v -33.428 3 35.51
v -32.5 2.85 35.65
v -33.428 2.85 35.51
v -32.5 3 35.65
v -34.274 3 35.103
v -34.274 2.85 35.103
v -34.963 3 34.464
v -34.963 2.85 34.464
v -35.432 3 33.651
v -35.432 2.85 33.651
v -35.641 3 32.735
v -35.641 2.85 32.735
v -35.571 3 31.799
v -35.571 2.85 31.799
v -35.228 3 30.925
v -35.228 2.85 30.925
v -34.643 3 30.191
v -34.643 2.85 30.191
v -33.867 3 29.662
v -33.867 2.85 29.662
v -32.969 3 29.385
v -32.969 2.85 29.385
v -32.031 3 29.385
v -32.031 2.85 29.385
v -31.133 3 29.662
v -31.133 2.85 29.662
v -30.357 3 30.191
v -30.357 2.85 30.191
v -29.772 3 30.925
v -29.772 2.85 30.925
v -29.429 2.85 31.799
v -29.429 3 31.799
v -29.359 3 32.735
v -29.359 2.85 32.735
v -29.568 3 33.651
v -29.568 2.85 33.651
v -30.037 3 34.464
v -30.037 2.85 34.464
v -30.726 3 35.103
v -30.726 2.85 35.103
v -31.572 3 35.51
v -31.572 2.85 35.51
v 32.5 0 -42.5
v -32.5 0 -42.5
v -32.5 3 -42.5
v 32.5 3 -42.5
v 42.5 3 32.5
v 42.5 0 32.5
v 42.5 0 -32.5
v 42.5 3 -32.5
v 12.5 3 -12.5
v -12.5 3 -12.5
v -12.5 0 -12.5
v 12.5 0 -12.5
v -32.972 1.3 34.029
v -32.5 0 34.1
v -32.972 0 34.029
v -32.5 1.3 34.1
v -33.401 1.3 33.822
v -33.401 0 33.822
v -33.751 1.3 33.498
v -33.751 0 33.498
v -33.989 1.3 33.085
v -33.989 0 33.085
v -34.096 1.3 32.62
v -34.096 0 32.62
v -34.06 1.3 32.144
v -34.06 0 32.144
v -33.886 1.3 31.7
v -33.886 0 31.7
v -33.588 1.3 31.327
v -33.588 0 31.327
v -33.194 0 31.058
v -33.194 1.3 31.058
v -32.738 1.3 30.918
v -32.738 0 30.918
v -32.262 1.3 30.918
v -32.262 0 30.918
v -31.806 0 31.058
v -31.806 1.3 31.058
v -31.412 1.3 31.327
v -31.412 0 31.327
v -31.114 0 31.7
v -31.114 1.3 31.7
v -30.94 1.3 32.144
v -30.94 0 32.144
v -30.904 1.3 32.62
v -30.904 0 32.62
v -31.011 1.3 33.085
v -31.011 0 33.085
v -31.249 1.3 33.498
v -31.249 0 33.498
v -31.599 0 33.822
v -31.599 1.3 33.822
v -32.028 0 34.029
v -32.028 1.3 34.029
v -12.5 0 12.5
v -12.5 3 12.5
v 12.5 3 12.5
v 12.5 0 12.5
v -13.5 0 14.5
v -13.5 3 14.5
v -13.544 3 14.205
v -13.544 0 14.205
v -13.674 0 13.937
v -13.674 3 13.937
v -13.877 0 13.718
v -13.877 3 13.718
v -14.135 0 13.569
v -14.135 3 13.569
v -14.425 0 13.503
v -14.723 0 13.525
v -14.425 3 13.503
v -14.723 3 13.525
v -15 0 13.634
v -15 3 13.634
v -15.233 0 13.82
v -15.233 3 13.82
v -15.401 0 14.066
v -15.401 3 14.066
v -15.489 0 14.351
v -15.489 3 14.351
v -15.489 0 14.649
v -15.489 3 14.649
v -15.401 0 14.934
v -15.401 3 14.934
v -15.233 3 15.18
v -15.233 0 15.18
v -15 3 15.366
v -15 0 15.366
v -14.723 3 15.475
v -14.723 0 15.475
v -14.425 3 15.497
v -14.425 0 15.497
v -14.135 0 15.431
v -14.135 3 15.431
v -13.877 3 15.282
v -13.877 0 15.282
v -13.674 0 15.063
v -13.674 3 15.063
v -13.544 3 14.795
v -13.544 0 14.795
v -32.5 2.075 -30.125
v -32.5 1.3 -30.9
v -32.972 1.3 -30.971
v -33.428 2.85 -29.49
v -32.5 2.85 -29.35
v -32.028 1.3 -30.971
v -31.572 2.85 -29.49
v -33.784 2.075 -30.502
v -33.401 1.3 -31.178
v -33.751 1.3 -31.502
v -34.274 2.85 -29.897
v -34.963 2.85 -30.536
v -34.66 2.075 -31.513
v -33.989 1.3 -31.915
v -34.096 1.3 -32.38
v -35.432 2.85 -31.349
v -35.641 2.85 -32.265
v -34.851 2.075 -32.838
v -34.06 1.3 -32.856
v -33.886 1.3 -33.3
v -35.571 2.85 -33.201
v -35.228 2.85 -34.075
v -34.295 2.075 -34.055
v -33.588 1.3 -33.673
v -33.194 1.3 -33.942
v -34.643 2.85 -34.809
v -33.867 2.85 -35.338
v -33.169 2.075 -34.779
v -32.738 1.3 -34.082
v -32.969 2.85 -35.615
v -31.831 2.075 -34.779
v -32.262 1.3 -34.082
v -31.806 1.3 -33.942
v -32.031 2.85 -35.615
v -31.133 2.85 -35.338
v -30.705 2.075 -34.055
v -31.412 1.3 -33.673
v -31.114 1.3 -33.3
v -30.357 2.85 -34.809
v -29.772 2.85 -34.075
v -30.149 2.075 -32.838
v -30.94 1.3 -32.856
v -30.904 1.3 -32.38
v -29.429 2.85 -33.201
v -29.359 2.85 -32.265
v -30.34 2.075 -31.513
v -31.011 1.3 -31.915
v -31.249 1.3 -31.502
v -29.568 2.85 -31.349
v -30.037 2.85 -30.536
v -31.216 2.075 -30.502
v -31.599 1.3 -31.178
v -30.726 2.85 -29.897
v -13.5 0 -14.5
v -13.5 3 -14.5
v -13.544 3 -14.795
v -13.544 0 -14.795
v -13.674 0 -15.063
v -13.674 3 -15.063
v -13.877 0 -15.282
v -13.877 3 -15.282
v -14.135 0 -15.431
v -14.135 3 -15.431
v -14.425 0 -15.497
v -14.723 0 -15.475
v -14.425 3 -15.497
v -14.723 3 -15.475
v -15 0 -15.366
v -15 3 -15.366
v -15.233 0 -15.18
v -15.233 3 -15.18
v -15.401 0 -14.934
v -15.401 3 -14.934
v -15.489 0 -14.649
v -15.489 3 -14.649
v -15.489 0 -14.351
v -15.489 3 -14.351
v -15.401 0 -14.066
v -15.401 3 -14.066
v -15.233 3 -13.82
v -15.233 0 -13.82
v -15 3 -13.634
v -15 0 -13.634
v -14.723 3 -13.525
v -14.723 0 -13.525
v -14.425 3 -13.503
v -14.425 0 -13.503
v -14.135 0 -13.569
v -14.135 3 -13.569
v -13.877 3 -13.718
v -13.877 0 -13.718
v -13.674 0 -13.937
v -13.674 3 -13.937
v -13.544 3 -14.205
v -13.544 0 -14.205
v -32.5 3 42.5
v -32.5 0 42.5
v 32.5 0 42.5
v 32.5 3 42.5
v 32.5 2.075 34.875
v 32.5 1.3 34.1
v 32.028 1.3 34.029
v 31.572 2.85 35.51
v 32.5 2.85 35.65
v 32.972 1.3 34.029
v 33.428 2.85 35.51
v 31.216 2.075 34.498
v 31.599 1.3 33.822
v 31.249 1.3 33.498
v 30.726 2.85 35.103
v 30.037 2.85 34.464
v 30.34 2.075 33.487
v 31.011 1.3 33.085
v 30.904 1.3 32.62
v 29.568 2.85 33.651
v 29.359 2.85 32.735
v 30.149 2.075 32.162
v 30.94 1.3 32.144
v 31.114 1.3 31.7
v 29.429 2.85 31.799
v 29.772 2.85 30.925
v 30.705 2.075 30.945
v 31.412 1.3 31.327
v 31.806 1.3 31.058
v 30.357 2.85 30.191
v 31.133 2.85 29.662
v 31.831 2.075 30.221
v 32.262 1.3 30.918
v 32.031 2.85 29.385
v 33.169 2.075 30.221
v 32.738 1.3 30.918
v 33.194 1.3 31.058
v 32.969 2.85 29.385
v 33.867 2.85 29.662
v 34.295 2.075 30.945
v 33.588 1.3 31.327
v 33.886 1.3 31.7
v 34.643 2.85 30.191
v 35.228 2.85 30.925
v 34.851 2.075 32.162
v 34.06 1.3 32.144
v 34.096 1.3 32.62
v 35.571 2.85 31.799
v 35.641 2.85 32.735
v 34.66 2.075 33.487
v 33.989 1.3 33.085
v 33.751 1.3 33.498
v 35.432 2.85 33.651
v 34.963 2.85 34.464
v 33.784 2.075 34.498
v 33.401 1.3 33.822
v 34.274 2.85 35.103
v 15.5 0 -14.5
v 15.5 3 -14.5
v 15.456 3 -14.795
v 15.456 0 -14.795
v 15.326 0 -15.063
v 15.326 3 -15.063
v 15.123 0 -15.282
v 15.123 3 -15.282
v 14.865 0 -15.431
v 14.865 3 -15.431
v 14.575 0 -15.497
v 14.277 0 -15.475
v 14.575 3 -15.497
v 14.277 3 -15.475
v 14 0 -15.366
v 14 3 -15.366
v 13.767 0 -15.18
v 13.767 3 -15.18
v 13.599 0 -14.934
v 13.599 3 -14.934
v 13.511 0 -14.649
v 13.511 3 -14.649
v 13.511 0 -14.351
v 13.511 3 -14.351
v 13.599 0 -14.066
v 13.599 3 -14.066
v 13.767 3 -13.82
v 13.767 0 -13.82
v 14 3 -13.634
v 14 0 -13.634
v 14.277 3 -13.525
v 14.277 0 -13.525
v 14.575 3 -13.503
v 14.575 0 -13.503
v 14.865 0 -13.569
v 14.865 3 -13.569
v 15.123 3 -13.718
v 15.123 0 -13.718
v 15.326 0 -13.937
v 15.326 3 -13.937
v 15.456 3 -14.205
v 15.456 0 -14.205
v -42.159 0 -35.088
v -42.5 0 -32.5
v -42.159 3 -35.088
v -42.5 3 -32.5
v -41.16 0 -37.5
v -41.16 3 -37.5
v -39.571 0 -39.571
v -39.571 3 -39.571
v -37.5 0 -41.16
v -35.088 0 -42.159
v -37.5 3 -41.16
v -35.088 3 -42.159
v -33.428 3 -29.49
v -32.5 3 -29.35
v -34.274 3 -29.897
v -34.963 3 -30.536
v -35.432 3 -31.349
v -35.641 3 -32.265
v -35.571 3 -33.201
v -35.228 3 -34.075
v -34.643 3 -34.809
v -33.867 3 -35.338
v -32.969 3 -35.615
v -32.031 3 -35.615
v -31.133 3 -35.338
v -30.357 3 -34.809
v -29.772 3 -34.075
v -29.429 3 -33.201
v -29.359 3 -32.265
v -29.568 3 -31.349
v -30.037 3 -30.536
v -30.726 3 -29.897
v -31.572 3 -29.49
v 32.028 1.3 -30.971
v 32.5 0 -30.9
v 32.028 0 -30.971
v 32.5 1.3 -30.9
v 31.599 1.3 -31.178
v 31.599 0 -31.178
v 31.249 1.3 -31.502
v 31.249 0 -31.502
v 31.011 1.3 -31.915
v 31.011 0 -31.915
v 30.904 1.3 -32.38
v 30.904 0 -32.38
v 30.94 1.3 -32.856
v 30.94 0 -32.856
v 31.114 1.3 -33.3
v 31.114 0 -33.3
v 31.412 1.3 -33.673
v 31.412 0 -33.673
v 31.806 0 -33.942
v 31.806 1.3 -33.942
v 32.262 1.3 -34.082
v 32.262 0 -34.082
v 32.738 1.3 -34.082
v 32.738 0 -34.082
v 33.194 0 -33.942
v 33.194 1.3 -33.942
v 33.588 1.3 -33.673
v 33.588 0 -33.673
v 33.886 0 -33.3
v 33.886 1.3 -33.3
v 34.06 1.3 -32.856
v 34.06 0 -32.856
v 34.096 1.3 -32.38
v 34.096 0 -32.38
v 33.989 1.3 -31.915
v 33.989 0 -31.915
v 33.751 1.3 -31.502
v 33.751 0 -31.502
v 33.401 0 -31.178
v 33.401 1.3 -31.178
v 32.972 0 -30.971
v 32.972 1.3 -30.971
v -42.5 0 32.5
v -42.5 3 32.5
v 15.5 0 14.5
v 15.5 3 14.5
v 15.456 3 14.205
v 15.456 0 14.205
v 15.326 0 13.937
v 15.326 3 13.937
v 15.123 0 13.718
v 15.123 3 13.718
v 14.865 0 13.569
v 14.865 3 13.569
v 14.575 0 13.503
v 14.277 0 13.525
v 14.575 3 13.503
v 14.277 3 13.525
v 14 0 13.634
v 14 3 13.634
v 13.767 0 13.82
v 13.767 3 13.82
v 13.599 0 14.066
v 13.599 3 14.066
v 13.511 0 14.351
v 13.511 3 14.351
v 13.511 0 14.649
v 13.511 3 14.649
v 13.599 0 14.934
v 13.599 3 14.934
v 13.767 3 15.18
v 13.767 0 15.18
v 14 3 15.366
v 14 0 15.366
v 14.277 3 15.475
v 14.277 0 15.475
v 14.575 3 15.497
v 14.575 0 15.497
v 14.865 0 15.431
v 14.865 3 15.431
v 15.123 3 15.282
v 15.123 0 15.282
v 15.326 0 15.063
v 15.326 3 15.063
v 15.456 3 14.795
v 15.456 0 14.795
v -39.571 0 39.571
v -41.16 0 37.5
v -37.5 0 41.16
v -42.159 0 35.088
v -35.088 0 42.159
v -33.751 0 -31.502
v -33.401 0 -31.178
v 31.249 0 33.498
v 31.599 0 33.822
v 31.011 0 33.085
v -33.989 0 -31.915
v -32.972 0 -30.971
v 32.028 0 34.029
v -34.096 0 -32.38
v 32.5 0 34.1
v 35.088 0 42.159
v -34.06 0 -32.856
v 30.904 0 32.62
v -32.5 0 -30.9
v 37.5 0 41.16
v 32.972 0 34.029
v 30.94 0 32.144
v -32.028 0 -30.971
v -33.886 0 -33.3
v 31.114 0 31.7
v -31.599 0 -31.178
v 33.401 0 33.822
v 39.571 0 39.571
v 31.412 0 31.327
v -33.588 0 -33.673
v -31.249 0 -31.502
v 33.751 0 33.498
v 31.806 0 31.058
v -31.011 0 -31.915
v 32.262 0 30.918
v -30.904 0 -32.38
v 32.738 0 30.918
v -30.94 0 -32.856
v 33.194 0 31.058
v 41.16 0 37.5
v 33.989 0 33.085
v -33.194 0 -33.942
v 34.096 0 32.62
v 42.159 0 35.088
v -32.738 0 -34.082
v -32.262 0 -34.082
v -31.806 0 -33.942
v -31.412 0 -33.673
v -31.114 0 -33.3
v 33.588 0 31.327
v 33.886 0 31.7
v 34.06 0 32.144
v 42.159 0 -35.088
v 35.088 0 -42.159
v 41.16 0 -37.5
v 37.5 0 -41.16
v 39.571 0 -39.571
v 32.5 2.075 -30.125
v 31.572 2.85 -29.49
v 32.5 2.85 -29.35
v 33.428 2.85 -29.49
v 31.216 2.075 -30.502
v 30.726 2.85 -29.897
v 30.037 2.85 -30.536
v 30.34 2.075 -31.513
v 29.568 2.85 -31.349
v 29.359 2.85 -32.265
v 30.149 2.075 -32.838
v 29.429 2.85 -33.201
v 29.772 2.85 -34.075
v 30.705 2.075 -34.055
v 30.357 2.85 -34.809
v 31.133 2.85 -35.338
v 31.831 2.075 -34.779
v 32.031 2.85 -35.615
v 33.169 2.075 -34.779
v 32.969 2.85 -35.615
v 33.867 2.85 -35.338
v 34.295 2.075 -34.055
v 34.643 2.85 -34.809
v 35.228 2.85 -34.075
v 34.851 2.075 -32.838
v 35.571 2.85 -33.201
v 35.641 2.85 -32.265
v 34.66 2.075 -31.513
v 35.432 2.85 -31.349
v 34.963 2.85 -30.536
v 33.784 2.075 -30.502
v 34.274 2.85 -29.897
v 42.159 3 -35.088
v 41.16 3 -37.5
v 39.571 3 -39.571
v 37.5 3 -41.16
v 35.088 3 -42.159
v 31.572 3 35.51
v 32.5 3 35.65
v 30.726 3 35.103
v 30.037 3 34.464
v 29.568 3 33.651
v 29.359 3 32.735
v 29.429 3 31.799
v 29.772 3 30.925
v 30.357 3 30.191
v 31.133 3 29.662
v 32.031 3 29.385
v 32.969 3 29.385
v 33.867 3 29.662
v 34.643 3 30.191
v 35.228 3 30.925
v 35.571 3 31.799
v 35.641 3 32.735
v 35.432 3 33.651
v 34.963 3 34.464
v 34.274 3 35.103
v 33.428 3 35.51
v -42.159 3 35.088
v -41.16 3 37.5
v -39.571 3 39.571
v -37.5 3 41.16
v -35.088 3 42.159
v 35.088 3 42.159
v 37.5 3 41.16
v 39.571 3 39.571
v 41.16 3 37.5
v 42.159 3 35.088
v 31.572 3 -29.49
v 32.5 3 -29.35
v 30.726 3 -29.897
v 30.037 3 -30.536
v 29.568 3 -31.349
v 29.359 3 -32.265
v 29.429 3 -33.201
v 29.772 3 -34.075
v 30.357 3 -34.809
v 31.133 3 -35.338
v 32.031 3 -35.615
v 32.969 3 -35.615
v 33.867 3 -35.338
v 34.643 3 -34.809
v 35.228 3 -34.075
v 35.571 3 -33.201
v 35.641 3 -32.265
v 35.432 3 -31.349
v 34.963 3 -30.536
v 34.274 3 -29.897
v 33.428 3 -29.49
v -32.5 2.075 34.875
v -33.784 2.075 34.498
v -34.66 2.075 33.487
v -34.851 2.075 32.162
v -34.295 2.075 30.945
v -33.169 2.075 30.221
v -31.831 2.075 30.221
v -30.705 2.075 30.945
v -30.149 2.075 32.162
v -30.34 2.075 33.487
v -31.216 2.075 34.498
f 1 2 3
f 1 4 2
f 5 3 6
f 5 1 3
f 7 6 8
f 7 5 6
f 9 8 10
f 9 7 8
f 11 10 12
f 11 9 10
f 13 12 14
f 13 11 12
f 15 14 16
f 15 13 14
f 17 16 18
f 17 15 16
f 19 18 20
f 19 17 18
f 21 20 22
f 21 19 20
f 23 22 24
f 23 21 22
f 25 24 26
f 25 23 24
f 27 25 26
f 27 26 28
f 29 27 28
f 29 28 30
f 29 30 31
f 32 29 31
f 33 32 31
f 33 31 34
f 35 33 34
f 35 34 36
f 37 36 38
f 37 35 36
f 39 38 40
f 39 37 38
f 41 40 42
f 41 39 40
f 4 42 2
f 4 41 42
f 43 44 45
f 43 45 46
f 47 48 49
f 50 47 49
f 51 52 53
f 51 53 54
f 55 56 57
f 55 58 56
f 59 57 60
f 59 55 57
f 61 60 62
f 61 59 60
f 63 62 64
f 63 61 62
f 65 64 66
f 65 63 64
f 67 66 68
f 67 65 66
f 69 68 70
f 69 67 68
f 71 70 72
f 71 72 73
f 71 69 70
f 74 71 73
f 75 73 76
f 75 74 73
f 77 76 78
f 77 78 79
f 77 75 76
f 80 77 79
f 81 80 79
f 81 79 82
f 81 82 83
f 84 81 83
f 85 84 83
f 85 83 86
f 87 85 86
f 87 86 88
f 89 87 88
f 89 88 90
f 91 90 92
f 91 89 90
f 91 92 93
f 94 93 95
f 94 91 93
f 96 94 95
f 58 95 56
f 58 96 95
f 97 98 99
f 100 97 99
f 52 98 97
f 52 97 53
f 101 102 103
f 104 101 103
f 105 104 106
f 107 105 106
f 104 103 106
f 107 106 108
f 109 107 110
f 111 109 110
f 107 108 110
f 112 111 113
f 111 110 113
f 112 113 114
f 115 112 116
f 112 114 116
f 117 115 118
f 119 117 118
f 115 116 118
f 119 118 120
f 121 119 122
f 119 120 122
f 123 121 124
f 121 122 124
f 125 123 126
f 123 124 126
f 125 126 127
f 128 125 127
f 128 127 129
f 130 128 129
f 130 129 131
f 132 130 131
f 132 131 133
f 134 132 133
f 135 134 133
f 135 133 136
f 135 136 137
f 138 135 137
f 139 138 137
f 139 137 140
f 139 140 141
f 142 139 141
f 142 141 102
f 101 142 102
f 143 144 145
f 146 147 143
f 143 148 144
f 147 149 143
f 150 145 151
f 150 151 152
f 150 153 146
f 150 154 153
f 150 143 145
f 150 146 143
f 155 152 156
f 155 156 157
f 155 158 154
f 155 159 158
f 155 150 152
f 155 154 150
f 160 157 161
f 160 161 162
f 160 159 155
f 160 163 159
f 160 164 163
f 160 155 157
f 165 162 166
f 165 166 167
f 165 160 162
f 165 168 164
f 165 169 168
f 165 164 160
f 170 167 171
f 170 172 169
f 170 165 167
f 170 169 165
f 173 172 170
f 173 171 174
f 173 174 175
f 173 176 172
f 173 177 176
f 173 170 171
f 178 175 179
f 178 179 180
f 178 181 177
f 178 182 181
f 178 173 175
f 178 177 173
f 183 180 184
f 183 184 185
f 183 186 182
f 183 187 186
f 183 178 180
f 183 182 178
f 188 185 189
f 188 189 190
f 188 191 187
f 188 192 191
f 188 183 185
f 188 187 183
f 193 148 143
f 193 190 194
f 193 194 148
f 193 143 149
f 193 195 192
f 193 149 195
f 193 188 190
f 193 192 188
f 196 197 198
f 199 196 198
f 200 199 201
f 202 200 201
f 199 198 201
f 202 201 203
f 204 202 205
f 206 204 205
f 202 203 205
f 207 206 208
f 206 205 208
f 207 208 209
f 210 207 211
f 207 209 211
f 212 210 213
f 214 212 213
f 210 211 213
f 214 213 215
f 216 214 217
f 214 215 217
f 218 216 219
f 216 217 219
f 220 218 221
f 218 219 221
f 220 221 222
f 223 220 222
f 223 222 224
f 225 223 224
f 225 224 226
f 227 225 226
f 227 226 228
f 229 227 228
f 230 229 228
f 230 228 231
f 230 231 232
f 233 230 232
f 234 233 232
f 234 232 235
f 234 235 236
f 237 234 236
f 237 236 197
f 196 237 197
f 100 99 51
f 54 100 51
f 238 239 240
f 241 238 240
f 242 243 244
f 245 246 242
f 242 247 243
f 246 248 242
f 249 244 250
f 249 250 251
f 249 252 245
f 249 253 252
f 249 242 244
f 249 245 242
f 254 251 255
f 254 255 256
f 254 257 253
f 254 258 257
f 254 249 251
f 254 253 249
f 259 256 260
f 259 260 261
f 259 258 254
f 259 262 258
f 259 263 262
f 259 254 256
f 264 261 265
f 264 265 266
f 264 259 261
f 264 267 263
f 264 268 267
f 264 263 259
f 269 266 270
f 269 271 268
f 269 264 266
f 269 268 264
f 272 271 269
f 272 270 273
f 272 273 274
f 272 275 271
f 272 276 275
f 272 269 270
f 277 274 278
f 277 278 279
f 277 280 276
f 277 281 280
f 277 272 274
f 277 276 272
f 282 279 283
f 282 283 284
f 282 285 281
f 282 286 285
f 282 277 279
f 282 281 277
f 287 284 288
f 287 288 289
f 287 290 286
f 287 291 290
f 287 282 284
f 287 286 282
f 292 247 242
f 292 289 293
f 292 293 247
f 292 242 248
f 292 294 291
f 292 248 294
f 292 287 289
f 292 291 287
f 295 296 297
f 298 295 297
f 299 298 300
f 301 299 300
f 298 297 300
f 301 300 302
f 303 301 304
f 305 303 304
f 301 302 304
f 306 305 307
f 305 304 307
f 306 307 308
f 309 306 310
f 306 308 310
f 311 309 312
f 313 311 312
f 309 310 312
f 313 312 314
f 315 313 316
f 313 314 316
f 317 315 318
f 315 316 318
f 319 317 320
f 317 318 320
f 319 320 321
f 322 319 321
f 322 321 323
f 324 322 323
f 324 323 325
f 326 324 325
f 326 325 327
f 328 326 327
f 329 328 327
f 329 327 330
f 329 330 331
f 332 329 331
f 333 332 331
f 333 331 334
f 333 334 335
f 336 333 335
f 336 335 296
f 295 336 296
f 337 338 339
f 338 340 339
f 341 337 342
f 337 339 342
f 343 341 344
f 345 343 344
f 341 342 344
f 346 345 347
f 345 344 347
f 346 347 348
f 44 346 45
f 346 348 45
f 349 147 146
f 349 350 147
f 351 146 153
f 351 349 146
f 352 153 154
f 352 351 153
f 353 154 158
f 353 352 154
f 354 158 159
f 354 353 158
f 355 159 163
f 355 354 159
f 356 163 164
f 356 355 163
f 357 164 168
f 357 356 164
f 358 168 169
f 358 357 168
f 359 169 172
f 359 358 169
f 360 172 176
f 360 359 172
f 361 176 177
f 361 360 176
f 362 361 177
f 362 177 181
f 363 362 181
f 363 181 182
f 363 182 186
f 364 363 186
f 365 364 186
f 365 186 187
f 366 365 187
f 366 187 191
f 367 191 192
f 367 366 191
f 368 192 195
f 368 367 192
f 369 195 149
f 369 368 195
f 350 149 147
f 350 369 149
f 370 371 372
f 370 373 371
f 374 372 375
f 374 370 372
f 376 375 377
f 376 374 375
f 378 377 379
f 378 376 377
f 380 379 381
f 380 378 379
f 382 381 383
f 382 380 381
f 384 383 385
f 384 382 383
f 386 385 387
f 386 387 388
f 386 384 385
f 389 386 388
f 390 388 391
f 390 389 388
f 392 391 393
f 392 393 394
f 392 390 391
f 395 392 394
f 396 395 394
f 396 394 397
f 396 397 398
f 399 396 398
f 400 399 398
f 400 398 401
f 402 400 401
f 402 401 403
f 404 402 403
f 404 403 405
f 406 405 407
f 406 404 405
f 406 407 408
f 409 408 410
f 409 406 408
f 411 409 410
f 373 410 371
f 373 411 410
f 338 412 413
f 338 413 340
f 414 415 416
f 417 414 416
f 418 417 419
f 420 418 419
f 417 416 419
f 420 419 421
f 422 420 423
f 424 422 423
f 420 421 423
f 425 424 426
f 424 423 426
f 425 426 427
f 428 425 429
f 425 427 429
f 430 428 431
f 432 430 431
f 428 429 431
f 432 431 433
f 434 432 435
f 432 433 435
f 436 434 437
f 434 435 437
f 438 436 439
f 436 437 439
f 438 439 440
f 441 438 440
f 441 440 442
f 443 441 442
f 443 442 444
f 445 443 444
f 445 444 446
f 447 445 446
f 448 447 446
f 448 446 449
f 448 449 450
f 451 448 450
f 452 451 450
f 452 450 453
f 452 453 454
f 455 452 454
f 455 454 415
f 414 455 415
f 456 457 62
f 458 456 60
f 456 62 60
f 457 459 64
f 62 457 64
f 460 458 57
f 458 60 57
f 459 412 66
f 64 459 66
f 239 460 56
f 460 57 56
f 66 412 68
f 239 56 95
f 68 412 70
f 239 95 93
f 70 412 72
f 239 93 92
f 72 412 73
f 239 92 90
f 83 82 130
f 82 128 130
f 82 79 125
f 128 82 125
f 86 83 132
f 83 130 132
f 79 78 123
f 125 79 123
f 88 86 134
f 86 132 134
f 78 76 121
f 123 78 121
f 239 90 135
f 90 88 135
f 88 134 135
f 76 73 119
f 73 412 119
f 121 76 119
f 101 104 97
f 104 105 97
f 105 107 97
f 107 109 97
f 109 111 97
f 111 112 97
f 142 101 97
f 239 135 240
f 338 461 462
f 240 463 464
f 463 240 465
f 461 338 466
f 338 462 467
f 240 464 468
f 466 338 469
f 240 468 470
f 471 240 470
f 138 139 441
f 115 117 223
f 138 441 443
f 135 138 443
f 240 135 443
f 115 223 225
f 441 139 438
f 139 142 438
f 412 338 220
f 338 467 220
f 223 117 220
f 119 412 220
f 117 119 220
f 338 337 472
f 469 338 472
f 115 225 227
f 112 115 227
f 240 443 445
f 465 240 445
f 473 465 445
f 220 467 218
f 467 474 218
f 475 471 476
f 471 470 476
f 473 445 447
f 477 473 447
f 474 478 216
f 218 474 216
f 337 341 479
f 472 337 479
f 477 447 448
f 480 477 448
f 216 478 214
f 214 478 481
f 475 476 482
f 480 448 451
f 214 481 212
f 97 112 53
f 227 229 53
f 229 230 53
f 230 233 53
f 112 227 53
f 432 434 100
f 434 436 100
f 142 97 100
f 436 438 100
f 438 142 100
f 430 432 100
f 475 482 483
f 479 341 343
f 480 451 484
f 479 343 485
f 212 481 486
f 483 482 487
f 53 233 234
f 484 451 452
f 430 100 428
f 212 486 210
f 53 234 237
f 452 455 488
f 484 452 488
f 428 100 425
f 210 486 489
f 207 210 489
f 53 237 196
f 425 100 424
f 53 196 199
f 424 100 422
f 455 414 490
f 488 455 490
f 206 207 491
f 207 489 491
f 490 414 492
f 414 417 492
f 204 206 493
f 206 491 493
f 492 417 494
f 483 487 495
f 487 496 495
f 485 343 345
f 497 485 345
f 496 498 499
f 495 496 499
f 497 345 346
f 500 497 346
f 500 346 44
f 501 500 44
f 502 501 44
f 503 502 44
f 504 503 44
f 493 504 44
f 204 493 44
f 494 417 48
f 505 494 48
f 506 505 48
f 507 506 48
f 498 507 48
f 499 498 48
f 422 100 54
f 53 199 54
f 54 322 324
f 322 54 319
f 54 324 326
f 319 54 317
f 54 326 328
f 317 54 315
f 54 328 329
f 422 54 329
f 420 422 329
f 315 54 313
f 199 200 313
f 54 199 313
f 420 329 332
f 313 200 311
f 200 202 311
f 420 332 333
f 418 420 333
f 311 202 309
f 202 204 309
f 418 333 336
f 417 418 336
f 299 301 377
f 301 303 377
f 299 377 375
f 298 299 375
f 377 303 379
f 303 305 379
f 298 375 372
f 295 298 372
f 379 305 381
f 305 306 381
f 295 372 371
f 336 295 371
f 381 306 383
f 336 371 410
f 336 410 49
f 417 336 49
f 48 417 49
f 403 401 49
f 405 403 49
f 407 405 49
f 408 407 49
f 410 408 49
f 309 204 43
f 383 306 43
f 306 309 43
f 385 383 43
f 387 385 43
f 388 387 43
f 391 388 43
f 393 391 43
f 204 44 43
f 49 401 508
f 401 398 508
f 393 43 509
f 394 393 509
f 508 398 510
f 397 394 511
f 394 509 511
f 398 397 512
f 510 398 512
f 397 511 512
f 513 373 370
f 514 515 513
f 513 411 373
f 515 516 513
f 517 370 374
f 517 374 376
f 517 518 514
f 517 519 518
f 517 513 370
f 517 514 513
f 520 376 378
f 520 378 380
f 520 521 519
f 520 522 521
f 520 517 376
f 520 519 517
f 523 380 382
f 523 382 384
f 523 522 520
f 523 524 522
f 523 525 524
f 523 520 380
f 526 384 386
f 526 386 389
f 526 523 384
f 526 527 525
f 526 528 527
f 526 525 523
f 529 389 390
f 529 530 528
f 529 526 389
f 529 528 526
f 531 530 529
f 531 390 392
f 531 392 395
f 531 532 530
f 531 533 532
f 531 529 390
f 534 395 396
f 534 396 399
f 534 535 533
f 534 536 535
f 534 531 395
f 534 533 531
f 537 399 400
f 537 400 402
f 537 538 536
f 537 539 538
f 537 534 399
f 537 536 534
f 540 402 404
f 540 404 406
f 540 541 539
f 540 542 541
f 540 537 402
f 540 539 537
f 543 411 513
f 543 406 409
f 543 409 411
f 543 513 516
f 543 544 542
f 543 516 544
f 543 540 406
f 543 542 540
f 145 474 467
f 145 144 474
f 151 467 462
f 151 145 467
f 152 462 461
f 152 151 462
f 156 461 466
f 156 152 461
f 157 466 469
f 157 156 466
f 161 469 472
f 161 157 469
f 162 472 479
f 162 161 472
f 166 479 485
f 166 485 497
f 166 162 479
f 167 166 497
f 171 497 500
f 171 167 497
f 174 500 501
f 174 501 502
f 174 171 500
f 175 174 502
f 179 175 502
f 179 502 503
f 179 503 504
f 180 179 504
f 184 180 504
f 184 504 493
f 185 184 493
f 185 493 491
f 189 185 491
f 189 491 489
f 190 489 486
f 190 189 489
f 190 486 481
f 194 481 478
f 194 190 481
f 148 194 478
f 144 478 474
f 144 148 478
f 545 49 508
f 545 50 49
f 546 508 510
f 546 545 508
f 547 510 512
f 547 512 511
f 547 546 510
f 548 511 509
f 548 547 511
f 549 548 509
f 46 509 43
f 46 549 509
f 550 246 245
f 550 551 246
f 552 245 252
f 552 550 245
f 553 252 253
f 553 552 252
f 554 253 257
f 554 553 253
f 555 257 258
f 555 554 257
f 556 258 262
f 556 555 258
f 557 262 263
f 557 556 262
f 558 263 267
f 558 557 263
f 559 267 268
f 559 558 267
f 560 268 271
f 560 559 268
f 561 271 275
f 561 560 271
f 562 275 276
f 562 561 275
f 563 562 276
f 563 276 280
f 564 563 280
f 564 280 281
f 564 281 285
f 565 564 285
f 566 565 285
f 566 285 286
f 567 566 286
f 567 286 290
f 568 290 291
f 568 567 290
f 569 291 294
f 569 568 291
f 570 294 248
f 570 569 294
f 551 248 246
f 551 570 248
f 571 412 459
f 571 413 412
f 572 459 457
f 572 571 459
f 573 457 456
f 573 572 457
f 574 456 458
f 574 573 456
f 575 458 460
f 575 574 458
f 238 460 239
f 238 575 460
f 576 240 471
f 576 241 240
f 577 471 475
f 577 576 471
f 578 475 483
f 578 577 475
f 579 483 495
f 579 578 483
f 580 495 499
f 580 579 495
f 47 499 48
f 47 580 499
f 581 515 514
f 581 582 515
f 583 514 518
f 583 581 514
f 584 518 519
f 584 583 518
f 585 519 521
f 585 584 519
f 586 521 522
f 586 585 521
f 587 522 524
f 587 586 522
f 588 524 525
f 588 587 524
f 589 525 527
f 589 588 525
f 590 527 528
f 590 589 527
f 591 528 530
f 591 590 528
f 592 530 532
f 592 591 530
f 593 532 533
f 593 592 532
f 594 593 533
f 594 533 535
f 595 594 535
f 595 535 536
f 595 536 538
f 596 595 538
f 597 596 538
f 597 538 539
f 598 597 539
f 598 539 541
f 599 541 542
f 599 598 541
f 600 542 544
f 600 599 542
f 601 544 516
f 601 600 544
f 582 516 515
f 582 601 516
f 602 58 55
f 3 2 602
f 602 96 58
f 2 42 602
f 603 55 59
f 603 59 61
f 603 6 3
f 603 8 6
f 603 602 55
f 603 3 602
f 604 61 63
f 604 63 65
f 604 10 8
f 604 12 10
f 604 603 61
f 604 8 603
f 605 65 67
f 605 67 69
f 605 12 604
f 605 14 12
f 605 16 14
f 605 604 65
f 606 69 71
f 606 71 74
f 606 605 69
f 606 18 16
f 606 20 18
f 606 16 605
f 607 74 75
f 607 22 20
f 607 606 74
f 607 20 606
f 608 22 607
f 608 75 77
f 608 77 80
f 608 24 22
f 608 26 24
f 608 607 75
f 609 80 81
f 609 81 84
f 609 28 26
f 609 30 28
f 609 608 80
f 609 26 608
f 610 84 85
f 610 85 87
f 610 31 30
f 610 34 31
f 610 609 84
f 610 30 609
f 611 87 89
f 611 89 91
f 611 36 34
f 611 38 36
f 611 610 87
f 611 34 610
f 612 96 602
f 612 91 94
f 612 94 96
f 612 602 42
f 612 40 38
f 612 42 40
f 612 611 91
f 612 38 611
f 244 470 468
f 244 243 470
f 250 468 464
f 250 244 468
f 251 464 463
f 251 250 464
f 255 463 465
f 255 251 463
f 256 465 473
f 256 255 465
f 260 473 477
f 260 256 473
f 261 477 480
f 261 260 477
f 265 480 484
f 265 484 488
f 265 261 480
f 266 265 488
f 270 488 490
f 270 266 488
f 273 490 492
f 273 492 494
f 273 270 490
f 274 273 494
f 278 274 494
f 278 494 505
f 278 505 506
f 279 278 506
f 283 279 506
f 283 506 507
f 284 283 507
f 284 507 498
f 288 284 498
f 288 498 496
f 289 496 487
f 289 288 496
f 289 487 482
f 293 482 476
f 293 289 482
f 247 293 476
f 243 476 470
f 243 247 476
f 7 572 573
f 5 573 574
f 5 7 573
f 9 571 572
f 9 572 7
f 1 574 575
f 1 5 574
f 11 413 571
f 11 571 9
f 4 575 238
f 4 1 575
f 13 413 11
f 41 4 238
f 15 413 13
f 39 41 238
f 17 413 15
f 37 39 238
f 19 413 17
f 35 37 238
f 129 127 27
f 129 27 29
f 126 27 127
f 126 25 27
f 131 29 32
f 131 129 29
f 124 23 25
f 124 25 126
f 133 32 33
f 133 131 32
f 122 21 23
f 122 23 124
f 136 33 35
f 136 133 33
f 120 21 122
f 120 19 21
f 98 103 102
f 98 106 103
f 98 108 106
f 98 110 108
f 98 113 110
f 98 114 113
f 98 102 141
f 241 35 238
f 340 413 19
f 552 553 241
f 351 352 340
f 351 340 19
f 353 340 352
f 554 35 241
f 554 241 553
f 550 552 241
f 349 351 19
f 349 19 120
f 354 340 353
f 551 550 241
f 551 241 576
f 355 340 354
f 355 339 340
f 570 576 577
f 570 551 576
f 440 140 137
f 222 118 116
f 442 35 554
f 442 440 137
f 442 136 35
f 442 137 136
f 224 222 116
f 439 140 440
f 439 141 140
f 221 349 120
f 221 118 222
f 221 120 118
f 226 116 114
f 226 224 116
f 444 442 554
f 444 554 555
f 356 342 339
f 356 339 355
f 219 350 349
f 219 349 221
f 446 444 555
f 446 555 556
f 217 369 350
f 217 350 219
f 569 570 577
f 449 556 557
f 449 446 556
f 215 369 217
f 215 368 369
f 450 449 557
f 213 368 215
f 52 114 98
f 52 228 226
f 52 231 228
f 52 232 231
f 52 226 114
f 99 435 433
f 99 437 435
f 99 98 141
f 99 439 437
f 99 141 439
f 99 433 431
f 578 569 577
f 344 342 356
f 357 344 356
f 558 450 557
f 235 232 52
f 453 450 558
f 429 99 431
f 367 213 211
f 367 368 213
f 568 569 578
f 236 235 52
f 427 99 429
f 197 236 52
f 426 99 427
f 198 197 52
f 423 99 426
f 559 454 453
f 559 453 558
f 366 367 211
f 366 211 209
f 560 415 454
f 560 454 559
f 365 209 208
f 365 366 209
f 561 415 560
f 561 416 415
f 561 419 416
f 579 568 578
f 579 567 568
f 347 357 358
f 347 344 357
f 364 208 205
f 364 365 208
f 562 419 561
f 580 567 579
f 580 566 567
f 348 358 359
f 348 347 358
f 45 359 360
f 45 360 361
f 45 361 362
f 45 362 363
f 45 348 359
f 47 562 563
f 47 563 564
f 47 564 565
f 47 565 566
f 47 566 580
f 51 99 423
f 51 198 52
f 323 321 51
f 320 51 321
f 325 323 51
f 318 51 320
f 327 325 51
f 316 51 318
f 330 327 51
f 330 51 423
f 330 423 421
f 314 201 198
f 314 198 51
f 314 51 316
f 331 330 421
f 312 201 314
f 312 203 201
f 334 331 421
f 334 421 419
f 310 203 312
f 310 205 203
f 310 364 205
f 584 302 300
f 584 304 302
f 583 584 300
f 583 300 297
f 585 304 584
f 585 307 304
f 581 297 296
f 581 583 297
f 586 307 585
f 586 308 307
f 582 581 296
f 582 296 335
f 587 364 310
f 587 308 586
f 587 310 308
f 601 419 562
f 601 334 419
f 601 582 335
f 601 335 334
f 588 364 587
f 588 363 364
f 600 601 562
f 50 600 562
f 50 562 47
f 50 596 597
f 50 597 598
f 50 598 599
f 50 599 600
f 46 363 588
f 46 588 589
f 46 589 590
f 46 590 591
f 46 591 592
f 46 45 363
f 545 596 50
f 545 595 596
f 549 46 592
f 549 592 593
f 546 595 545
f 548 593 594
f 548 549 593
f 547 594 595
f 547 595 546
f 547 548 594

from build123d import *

# Parameters (mm, degrees)
SKETCH1_W                                      = 85
SKETCH1_H                                      = 85
BOSS_EXTRUDE1_DEPTH                            = 3
FILLET1_R                                      = 10
CUT_EXTRUDE1_REACH                             = 5
SKETCH3_W                                      = 25
SKETCH3_H                                      = 25
CSK_FOR_M3_FLAT_HEAD_MACHINE_SCREW1_AT_2_COUNT = 2
CSK_FOR_M3_FLAT_HEAD_MACHINE_SCREW1_AT_2_PITCH = 65
CSK_FOR_M3_FLAT_HEAD_MACHINE_SCREW1_AT_3_COUNT = 2
CSK_FOR_M3_FLAT_HEAD_MACHINE_SCREW1_AT_3_PITCH = 91.923881554
CSK_FOR_M3_FLAT_HEAD_MACHINE_SCREW1_AT_4_COUNT = 2
CSK_FOR_M3_FLAT_HEAD_MACHINE_SCREW1_AT_4_PITCH = 65
SKETCH6_R                                      = 1
CUT_EXTRUDE2_DEPTH                             = 4


with BuildPart() as part:
    # Sketch1 → Boss-Extrude1 (new body)
    with BuildSketch(Plane(origin=(0, 0, 0), x_dir=(1, 0, 0), z_dir=(0, 1, 0))):
        Rectangle(SKETCH1_W, SKETCH1_H)
    extrude(amount=BOSS_EXTRUDE1_DEPTH)

    # Fillet1
    fillet1_edges = [part.edges().sort_by_distance(p)[0] for p in [
        (42.5, 1.5, 42.5),
        (-42.5, 1.5, 42.5),
        (-42.5, 1.5, -42.5),
        (42.5, 1.5, -42.5),
    ]]
    fillet(fillet1_edges, radius=FILLET1_R)

    # Sketch3 → Cut-Extrude1 (cut, up to next)
    with BuildSketch(Plane(origin=(0, 3, 0), x_dir=(1, 0, 0), z_dir=(0, 1, 0)), mode=Mode.PRIVATE) as cut_extrude1_sk1:
        Rectangle(SKETCH3_W, SKETCH3_H)
    cut_extrude1_tool1 = extrude(cut_extrude1_sk1.sketch, amount=-CUT_EXTRUDE1_REACH, mode=Mode.PRIVATE) & part.part
    add(cut_extrude1_tool1.solids().sort_by_distance((0, 3, 0))[0], mode=Mode.SUBTRACT)

    # Sketch4 → CSK for M3 Flat Head Machine Screw1 (revolve, cut)
    with BuildSketch(Plane(origin=(32.5, 3, -32.5), x_dir=(0, 0, 1), z_dir=(1, 0, 0))):
        Polygon((0, 0), (0, 3), (1.6, 3), (1.6, 1.7), (3.15, 0.15), (3.15, 0), align=None)
    csk_for_m3_flat_head_machine_screw1 = revolve(axis=Axis((32.5, 9.35, -32.5), (0, -1, 0)), mode=Mode.SUBTRACT)

    # CSK for M3 Flat Head Machine Screw1 at 2: CSK for M3 Flat Head Machine Screw1 ×2
    with Locations(*[(0, 0, i * CSK_FOR_M3_FLAT_HEAD_MACHINE_SCREW1_AT_2_PITCH) for i in range(1, CSK_FOR_M3_FLAT_HEAD_MACHINE_SCREW1_AT_2_COUNT)]):
        add(csk_for_m3_flat_head_machine_screw1, mode=Mode.SUBTRACT)

    # CSK for M3 Flat Head Machine Screw1 at 3: CSK for M3 Flat Head Machine Screw1 ×2
    with Locations(*[Vector(-0.707106781, 0, 0.707106781) * (i * CSK_FOR_M3_FLAT_HEAD_MACHINE_SCREW1_AT_3_PITCH) for i in range(1, CSK_FOR_M3_FLAT_HEAD_MACHINE_SCREW1_AT_3_COUNT)]):
        add(csk_for_m3_flat_head_machine_screw1, mode=Mode.SUBTRACT)

    # CSK for M3 Flat Head Machine Screw1 at 4: CSK for M3 Flat Head Machine Screw1 ×2
    with Locations(*[(-i * CSK_FOR_M3_FLAT_HEAD_MACHINE_SCREW1_AT_4_PITCH, 0, 0) for i in range(1, CSK_FOR_M3_FLAT_HEAD_MACHINE_SCREW1_AT_4_COUNT)]):
        add(csk_for_m3_flat_head_machine_screw1, mode=Mode.SUBTRACT)

    # Sketch6 → Cut-Extrude2 (cut, through all)
    with BuildSketch(Plane(origin=(0, 3, 0), x_dir=(1, 0, 0), z_dir=(0, 1, 0))):
        with Locations((-14.5, 14.5)):
            Circle(SKETCH6_R)
        with Locations((14.5, 14.5)):
            Circle(SKETCH6_R)
        with Locations((14.5, -14.5)):
            Circle(SKETCH6_R)
        with Locations((-14.5, -14.5)):
            Circle(SKETCH6_R)
    extrude(amount=-CUT_EXTRUDE2_DEPTH, mode=Mode.SUBTRACT)


solid = part.part
